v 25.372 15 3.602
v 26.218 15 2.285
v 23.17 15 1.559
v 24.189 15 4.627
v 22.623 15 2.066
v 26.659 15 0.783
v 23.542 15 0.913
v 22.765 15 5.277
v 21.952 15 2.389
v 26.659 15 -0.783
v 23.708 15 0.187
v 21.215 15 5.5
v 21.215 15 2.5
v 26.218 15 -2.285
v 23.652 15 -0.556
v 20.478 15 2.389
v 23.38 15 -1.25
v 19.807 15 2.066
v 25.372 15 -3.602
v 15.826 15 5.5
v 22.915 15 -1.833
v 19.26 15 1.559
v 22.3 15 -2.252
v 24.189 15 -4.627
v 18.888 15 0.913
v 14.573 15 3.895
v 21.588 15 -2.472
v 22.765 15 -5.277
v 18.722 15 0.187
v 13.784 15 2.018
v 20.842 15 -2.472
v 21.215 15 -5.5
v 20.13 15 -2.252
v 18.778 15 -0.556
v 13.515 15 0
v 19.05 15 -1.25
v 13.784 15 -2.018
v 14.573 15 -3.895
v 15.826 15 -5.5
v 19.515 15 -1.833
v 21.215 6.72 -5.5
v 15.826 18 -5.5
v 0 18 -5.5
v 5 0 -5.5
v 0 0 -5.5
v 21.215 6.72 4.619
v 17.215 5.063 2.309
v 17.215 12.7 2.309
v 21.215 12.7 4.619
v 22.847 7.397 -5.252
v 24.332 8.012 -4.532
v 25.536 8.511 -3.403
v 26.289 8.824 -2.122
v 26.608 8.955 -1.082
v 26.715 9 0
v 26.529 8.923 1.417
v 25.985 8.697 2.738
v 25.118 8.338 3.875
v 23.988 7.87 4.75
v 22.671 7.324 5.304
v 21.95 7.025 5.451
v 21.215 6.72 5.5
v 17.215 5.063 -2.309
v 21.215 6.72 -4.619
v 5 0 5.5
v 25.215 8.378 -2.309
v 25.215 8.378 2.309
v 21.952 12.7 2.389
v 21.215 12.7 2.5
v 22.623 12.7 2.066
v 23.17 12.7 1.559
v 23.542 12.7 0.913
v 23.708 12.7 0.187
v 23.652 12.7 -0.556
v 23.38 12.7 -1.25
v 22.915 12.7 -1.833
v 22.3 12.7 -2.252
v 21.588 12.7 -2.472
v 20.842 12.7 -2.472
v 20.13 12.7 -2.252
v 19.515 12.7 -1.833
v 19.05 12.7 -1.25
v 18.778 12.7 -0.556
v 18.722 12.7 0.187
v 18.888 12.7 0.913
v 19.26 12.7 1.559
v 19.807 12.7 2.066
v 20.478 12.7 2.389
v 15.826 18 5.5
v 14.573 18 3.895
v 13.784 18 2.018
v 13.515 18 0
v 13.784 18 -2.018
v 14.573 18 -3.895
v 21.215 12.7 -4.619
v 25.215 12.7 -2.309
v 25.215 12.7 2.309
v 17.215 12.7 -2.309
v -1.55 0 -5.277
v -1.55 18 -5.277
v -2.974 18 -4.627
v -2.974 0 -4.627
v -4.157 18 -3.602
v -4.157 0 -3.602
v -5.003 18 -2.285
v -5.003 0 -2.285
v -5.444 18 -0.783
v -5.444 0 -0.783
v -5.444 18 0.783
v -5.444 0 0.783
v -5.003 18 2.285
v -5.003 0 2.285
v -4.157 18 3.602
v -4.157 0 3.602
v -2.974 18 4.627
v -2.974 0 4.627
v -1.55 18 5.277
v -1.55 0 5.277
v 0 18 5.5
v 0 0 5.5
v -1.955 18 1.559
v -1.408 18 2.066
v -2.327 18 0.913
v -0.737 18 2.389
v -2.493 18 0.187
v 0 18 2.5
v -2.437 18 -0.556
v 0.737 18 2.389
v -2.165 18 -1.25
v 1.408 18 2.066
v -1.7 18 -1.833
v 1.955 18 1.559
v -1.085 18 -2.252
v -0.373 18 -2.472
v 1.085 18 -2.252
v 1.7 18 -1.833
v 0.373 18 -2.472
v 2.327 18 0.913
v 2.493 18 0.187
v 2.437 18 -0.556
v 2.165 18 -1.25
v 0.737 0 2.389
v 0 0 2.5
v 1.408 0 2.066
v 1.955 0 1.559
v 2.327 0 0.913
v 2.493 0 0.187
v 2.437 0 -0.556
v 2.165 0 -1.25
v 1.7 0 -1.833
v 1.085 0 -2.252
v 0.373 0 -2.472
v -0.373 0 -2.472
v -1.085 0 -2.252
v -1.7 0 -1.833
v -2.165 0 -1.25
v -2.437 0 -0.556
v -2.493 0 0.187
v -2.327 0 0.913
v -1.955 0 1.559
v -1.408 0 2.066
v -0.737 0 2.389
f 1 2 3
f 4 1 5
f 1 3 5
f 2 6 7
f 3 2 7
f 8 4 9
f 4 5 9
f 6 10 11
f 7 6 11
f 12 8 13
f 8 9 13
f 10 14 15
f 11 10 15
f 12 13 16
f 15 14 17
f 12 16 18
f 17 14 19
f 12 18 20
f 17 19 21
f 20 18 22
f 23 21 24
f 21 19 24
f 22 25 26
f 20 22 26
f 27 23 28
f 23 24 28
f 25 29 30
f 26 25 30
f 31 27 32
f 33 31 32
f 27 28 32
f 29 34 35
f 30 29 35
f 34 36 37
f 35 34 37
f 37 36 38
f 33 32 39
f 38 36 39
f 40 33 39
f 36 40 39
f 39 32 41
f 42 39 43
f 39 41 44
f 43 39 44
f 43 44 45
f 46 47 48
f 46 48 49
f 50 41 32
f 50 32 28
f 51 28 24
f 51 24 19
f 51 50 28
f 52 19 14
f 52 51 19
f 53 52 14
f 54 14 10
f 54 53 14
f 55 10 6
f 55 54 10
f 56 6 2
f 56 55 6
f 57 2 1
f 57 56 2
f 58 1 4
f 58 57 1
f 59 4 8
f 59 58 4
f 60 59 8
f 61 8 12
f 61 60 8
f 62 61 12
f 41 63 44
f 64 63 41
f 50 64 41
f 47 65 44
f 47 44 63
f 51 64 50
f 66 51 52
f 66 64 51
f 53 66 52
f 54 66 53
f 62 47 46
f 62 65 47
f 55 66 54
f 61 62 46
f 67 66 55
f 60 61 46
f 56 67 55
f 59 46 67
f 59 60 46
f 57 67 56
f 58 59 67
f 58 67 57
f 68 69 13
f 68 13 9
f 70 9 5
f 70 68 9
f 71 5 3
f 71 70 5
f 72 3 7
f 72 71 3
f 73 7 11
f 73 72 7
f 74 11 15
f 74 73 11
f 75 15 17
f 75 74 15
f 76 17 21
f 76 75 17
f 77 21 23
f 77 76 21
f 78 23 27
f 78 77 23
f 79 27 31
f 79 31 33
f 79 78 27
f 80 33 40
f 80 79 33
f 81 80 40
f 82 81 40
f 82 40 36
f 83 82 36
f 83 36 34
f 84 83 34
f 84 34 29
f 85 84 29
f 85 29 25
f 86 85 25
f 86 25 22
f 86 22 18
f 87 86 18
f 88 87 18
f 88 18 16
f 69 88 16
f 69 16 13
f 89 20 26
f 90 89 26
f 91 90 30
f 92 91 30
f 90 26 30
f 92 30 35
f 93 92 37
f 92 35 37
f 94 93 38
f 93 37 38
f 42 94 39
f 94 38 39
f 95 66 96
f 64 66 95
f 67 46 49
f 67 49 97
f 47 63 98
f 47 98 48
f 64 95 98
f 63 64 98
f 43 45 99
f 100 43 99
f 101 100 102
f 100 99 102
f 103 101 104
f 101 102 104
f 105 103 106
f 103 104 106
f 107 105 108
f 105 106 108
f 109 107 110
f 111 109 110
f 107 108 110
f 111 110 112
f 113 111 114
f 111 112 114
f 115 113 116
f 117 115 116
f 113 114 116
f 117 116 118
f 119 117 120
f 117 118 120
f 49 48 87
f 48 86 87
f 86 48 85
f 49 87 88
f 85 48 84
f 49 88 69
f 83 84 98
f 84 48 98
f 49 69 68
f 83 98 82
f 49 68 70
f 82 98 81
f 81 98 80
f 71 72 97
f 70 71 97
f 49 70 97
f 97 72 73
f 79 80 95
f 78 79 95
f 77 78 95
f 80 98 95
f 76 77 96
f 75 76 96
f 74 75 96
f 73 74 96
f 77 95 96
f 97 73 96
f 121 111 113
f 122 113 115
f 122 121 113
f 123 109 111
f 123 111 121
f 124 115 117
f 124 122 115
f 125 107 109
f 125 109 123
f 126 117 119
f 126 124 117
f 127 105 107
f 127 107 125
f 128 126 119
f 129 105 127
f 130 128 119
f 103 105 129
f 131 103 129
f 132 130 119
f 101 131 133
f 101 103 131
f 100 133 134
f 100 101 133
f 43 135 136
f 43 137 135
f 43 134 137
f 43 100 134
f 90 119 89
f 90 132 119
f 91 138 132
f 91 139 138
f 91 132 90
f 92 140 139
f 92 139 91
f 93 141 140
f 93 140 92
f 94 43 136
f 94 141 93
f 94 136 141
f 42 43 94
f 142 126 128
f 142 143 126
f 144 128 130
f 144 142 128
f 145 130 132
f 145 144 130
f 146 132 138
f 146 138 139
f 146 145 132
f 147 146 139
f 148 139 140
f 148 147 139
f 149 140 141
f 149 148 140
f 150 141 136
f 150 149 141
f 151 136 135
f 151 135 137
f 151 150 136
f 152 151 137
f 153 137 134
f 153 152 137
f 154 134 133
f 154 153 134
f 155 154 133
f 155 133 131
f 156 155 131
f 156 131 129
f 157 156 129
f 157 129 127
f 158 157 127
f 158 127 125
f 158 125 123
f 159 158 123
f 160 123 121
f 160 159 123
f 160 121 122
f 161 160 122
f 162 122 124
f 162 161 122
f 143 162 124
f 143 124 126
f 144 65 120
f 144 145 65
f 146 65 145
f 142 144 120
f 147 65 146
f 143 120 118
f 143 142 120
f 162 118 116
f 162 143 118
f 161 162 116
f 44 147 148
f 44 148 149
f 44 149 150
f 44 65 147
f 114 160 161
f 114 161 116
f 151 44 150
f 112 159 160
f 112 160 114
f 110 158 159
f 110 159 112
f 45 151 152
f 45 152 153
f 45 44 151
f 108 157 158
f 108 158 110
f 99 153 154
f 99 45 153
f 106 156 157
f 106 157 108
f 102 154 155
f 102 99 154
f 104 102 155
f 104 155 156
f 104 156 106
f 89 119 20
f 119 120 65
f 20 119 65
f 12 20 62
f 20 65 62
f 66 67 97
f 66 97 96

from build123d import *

# Parameters (mm, degrees)
CROQUIS1_R                 = 2.5
SALIENTE_EXTRUIR1_DEPTH    = 15
CORTAR_EXTRUIR1_DEPTH      = 15
CORTAR_EXTRUIR2_DEPTH      = 3.7
CORTAR_EXTRUIR2_DEPTH_BACK = 15
CROQUIS4_R                 = 2.5
SALIENTE_EXTRUIR2_DEPTH    = 3


with BuildPart() as part:
    # Croquis1 → Saliente-Extruir1 (new body)
    with BuildSketch(Plane(origin=(0, 0, 0), x_dir=(1, 0, 0), z_dir=(0, 1, 0))):
        with BuildLine():
            Line((0, 5.5), (21.215, 5.5))
            ThreePointArc((21.215, 5.5), (26.715, 0), (21.215, -5.5))
            Line((21.215, -5.5), (0, -5.5))
            ThreePointArc((0, -5.5), (-5.5, 0), (0, 5.5))
        make_face()
        with Locations(Location((0, 0, 0), (0, 0, 270))):
            Circle(CROQUIS1_R, mode=Mode.SUBTRACT)
        with Locations(Location((21.215, 0, 0), (0, 0, 270))):
            Circle(CROQUIS1_R, mode=Mode.SUBTRACT)
    extrude(amount=SALIENTE_EXTRUIR1_DEPTH)

    # Croquis2 → Cortar-Extruir1 (cut)
    with BuildSketch(Plane.XY.offset(5.5)):
        Polygon((5, 0), (26.715, 9), (26.715, 0), align=None)
    extrude(amount=-CORTAR_EXTRUIR1_DEPTH, mode=Mode.SUBTRACT)

    # Croquis3 → Cortar-Extruir2 (cut, two sides: drawn at the far end of the back side and taken through both)
    with BuildSketch(Plane(origin=(0, 9, 0), x_dir=(1, 0, 0), z_dir=(0, 1, 0)).offset(-CORTAR_EXTRUIR2_DEPTH_BACK)):
        Polygon((17.215, 2.309401077), (17.215, -2.309401077), (21.215, -4.618802154), (25.215, -2.309401077), (25.215, 2.309401077), (21.215, 4.618802154), align=None)
    extrude(amount=CORTAR_EXTRUIR2_DEPTH + CORTAR_EXTRUIR2_DEPTH_BACK, mode=Mode.SUBTRACT)

    # Croquis4 → Saliente-Extruir2 (add)
    with BuildSketch(Plane(origin=(0, 15, 0), x_dir=(1, 0, 0), z_dir=(0, 1, 0))):
        with BuildLine():
            Line((0, -5.5), (15.826122566, -5.5))
            ThreePointArc((15.826122566, -5.5), (13.515, 0), (15.826122566, 5.5))
            Line((15.826122566, 5.5), (0, 5.5))
            ThreePointArc((0, 5.5), (-5.5, 0), (0, -5.5))
        make_face()
        with Locations(Location((0, 0, 0), (0, 0, 270))):
            Circle(CROQUIS4_R, mode=Mode.SUBTRACT)
    extrude(amount=SALIENTE_EXTRUIR2_DEPTH)


solid = part.part
